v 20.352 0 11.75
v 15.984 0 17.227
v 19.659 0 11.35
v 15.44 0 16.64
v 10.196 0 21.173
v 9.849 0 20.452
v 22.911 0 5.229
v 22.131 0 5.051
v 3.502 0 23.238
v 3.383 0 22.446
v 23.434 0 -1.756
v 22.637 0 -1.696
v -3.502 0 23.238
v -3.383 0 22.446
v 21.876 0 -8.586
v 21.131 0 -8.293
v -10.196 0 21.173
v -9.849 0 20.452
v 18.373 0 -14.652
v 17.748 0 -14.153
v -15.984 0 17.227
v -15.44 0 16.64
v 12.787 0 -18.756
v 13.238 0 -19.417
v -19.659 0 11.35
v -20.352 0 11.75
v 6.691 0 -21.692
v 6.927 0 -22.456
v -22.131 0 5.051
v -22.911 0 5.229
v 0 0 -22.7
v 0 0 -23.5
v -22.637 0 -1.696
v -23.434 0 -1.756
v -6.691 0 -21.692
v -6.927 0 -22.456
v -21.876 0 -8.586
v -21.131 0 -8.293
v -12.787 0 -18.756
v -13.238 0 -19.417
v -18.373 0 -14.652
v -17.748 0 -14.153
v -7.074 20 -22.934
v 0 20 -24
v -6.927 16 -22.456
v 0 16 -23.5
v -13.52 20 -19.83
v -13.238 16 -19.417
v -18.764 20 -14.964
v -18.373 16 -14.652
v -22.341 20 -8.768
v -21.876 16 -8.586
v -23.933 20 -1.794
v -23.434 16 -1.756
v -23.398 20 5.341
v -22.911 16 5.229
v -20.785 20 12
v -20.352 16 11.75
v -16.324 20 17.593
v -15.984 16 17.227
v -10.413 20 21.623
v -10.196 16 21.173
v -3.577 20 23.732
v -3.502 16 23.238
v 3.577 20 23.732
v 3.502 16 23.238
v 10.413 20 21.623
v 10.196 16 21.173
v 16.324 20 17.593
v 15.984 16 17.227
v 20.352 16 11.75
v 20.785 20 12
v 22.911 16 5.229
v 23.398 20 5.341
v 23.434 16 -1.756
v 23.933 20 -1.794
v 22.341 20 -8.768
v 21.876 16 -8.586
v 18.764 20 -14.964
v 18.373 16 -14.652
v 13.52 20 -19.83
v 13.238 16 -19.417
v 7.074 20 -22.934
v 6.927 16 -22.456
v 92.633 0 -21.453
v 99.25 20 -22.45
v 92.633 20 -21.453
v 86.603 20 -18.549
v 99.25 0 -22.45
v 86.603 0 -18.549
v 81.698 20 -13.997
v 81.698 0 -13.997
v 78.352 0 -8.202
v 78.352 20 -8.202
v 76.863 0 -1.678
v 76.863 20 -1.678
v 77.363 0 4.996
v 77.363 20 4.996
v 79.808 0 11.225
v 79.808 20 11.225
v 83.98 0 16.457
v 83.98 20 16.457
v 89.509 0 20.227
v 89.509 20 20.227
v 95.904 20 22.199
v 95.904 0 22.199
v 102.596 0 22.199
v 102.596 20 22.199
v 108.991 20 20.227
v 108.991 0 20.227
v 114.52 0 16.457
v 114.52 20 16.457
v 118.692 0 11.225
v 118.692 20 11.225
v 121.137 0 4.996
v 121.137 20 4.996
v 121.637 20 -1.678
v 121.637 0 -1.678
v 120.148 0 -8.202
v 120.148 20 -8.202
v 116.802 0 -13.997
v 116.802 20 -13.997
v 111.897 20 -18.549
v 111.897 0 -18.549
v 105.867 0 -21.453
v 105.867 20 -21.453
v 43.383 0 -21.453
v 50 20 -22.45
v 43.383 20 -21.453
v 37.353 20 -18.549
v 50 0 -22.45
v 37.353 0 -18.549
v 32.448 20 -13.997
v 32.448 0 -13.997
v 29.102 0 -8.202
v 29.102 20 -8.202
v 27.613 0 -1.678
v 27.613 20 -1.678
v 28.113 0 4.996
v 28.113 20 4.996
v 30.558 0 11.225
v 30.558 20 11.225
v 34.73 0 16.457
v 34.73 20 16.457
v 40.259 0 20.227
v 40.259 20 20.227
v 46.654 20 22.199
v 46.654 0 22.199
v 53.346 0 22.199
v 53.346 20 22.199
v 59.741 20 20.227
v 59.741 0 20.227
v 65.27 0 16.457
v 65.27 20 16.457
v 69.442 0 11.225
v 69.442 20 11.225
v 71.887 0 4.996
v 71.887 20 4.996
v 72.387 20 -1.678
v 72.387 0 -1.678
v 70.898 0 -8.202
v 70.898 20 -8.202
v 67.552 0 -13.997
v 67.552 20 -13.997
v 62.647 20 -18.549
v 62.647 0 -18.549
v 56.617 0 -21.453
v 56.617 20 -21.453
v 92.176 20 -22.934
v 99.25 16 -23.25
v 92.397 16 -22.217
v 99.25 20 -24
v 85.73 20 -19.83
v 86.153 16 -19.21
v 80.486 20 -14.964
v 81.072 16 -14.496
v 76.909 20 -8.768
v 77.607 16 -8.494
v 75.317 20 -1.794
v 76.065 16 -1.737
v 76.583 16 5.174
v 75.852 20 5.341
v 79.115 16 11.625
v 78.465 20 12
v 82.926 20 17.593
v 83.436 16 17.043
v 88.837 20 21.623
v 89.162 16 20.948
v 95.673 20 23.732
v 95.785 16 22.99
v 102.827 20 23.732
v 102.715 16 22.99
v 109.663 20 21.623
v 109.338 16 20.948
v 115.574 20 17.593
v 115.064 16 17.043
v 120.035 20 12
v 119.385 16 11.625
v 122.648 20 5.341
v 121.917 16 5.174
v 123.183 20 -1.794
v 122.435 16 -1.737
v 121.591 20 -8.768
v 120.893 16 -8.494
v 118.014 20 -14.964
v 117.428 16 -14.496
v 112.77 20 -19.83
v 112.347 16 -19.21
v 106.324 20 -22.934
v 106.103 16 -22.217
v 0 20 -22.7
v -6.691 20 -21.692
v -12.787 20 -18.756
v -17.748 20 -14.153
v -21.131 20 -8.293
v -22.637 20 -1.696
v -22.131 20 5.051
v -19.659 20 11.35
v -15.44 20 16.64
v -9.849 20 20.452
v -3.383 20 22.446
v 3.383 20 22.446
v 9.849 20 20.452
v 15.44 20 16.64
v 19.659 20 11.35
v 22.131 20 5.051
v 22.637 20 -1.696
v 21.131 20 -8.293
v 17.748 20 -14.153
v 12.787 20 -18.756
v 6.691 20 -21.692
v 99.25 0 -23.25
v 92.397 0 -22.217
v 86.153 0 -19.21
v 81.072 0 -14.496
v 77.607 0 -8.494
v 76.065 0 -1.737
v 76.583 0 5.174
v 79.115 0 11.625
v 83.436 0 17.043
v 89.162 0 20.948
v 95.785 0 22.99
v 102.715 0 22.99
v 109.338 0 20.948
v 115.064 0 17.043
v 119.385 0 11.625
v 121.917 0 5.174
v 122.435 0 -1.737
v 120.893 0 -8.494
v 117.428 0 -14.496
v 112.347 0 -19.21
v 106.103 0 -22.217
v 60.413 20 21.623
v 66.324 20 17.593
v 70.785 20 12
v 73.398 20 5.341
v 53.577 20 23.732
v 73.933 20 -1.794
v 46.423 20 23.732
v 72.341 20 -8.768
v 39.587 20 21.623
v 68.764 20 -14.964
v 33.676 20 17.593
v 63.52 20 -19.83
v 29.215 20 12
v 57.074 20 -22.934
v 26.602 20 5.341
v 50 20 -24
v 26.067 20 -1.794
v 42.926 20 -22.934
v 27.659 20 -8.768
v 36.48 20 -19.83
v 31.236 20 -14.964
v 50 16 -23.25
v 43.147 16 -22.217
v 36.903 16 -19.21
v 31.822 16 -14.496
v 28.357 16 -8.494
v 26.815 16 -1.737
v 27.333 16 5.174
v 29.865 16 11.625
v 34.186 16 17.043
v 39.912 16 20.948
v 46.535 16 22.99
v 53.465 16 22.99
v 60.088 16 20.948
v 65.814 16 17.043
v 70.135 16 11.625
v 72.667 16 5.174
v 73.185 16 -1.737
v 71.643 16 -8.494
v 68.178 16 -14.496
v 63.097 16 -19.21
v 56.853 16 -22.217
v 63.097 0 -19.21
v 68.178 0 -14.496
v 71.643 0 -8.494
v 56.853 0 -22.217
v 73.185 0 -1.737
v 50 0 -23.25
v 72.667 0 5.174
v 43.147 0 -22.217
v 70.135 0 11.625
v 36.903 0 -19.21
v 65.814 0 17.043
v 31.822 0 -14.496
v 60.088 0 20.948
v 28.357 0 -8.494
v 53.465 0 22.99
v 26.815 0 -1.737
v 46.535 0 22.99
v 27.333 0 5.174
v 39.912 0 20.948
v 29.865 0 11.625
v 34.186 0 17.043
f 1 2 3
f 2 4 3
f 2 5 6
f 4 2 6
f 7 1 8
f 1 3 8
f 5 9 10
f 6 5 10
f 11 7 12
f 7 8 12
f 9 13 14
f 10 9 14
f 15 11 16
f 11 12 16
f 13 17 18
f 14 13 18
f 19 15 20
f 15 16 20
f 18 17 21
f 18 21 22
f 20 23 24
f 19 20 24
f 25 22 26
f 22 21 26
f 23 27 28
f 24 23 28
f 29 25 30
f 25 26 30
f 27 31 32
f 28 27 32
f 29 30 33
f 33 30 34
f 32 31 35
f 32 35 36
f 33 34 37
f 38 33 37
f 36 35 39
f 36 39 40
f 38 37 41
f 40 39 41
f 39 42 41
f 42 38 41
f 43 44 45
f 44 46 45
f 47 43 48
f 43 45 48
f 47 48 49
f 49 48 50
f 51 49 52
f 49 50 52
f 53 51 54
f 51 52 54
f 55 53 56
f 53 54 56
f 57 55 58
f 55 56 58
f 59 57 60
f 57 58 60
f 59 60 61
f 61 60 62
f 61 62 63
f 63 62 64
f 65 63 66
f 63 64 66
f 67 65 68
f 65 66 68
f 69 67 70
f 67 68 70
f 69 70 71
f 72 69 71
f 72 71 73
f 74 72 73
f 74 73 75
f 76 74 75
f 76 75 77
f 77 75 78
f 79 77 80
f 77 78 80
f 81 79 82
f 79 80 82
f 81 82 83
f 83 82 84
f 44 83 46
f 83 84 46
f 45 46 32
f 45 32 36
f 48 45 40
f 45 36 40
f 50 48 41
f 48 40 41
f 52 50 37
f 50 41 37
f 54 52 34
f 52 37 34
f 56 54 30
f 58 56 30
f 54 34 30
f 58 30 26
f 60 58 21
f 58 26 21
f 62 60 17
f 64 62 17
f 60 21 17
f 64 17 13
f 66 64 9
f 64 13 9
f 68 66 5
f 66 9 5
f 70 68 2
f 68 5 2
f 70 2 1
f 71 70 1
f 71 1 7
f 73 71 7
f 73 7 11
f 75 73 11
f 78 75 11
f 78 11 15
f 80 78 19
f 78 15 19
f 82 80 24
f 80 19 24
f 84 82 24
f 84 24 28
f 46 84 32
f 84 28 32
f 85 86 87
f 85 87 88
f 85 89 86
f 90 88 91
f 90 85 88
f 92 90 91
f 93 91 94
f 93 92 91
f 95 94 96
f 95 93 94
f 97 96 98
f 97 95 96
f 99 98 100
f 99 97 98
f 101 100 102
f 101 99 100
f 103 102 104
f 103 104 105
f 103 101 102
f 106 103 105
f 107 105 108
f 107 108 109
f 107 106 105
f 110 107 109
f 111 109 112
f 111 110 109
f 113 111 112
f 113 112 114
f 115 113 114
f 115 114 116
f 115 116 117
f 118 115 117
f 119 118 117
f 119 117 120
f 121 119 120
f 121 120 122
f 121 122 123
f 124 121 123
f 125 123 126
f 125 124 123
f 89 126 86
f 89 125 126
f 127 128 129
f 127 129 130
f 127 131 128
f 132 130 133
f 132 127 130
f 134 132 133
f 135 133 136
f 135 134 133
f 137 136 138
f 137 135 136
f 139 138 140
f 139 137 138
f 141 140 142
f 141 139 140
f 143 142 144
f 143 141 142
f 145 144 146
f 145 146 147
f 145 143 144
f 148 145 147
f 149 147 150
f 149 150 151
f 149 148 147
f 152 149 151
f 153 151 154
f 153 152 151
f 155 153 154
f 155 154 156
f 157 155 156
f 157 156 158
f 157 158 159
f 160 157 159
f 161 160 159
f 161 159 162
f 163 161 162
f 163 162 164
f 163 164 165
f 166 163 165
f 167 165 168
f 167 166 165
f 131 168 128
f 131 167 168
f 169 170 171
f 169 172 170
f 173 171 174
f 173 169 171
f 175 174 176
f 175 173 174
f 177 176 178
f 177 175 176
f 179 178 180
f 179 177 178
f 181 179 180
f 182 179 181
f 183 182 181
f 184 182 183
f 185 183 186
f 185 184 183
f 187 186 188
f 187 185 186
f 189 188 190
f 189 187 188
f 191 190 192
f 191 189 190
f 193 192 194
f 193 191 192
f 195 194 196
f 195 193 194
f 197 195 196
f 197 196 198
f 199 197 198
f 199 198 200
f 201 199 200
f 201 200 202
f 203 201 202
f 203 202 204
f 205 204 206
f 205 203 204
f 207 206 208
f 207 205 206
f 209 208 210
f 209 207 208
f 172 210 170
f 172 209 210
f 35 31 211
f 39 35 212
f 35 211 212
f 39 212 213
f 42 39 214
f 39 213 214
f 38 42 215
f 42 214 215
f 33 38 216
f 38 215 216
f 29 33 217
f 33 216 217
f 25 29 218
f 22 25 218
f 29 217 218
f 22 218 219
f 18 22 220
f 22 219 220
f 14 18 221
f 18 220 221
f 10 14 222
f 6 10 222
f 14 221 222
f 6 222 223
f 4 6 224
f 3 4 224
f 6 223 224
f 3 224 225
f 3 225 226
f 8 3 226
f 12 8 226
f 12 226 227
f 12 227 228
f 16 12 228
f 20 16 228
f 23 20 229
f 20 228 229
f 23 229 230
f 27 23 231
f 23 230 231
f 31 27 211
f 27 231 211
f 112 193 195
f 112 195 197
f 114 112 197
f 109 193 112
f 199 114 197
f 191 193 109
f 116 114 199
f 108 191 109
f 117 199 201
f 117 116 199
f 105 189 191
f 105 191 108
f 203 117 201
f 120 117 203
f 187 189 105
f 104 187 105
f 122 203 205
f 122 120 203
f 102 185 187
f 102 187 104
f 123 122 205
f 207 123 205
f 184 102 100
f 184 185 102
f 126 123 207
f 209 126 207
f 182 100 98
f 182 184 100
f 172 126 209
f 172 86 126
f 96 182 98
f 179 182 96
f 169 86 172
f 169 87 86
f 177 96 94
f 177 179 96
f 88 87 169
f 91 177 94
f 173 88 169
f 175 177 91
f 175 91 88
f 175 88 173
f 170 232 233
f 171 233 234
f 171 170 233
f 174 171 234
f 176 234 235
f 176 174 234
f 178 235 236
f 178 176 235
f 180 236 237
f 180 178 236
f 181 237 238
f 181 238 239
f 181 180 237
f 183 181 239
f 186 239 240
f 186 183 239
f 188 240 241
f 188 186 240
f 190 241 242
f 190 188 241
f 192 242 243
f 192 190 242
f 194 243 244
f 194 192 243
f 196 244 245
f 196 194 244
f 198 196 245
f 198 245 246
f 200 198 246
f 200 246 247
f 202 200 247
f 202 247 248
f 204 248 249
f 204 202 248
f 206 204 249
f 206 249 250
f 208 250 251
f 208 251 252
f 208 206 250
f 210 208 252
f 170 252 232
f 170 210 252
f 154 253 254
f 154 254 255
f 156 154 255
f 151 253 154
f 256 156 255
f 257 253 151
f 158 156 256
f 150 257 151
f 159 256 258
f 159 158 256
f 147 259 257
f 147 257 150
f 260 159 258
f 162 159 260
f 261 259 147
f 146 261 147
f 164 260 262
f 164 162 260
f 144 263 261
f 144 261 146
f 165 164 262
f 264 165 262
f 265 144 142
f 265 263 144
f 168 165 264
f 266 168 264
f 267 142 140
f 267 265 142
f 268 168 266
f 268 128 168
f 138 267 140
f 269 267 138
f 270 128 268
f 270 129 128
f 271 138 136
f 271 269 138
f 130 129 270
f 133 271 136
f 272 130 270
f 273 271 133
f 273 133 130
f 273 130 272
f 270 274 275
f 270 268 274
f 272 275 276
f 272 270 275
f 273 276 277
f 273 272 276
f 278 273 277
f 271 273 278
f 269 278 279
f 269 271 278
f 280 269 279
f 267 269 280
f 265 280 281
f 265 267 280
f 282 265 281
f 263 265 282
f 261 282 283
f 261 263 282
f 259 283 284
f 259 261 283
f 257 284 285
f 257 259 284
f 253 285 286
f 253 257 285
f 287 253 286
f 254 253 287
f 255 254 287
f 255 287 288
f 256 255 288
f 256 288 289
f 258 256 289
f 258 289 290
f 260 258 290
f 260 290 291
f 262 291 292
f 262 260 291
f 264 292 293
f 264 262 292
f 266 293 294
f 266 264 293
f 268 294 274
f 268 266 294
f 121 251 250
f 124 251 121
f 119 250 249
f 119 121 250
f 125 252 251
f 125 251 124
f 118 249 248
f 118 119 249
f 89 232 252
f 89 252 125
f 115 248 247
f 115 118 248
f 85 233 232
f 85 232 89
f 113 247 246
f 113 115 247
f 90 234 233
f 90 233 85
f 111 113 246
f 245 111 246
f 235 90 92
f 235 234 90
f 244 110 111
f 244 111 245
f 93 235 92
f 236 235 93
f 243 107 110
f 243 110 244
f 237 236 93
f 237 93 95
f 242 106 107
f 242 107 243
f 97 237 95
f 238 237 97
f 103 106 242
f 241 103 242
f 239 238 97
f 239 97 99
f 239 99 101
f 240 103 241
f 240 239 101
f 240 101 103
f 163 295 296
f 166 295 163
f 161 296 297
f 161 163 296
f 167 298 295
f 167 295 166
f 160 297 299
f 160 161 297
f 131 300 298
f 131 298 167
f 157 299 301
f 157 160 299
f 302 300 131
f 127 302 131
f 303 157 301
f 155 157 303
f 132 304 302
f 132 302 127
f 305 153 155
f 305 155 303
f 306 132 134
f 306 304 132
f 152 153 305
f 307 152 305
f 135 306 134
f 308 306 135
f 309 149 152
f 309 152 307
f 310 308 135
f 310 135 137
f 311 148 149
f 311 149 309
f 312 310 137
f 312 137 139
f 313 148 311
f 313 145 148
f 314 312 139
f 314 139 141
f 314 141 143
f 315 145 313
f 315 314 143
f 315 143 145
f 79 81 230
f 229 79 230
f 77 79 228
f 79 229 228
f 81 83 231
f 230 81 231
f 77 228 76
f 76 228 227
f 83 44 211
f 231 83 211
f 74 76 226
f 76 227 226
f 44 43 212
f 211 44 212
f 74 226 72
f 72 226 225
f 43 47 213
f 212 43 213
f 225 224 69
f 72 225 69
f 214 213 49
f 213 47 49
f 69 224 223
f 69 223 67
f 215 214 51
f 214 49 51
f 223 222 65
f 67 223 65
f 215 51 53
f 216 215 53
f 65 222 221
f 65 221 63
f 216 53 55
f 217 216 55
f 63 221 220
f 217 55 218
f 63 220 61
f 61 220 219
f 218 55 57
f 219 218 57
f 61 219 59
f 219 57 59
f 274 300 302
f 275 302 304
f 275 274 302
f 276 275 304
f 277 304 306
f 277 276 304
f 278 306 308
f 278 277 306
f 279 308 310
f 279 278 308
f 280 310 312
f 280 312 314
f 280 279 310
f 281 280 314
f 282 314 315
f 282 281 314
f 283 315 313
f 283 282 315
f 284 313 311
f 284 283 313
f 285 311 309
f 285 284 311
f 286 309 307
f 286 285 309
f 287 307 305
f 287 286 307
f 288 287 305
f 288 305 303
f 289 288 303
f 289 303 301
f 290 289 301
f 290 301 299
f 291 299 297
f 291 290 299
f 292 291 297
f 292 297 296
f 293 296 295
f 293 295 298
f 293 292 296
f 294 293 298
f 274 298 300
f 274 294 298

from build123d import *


with BuildPart() as part:
    # Sketch2 → Revolve1 (revolve)
    with BuildSketch(Plane.XY, mode=Mode.PRIVATE) as revolve1_sk:
        Polygon((22.7, 0), (22.7, 20), (24, 20), (23.5, 16), (23.5, 0), align=None)
    revolve(revolve1_sk.sketch.rotate(Axis((0, 0, 0), (0, 1, 0)), 90), axis=Axis((0, 0, 0), (0, 1, 0)))


with BuildPart() as body_2:
    # Sketch3 → Revolve2 (revolve)
    with BuildSketch(Plane.XY, mode=Mode.PRIVATE) as revolve2_sk:
        Polygon((73.25, 0), (73.25, 16), (74, 20), (72.45, 20), (72.45, 0), align=None)
    revolve(revolve2_sk.sketch.rotate(Axis((50, 0, 0), (0, 1, 0)), 90), axis=Axis((50, 0, 0), (0, 1, 0)))


with BuildPart() as body_3:
    # Sketch4 → Revolve3 (revolve)
    with BuildSketch(Plane.XY, mode=Mode.PRIVATE) as revolve3_sk:
        Polygon((122.5, 0), (122.5, 16), (123.25, 20), (121.7, 20), (121.7, 0), align=None)
    revolve(revolve3_sk.sketch.rotate(Axis((99.25, 0, 0), (0, 1, 0)), 90), axis=Axis((99.25, 0, 0), (0, 1, 0)))


solid = Compound([part.part, body_2.part, body_3.part])
